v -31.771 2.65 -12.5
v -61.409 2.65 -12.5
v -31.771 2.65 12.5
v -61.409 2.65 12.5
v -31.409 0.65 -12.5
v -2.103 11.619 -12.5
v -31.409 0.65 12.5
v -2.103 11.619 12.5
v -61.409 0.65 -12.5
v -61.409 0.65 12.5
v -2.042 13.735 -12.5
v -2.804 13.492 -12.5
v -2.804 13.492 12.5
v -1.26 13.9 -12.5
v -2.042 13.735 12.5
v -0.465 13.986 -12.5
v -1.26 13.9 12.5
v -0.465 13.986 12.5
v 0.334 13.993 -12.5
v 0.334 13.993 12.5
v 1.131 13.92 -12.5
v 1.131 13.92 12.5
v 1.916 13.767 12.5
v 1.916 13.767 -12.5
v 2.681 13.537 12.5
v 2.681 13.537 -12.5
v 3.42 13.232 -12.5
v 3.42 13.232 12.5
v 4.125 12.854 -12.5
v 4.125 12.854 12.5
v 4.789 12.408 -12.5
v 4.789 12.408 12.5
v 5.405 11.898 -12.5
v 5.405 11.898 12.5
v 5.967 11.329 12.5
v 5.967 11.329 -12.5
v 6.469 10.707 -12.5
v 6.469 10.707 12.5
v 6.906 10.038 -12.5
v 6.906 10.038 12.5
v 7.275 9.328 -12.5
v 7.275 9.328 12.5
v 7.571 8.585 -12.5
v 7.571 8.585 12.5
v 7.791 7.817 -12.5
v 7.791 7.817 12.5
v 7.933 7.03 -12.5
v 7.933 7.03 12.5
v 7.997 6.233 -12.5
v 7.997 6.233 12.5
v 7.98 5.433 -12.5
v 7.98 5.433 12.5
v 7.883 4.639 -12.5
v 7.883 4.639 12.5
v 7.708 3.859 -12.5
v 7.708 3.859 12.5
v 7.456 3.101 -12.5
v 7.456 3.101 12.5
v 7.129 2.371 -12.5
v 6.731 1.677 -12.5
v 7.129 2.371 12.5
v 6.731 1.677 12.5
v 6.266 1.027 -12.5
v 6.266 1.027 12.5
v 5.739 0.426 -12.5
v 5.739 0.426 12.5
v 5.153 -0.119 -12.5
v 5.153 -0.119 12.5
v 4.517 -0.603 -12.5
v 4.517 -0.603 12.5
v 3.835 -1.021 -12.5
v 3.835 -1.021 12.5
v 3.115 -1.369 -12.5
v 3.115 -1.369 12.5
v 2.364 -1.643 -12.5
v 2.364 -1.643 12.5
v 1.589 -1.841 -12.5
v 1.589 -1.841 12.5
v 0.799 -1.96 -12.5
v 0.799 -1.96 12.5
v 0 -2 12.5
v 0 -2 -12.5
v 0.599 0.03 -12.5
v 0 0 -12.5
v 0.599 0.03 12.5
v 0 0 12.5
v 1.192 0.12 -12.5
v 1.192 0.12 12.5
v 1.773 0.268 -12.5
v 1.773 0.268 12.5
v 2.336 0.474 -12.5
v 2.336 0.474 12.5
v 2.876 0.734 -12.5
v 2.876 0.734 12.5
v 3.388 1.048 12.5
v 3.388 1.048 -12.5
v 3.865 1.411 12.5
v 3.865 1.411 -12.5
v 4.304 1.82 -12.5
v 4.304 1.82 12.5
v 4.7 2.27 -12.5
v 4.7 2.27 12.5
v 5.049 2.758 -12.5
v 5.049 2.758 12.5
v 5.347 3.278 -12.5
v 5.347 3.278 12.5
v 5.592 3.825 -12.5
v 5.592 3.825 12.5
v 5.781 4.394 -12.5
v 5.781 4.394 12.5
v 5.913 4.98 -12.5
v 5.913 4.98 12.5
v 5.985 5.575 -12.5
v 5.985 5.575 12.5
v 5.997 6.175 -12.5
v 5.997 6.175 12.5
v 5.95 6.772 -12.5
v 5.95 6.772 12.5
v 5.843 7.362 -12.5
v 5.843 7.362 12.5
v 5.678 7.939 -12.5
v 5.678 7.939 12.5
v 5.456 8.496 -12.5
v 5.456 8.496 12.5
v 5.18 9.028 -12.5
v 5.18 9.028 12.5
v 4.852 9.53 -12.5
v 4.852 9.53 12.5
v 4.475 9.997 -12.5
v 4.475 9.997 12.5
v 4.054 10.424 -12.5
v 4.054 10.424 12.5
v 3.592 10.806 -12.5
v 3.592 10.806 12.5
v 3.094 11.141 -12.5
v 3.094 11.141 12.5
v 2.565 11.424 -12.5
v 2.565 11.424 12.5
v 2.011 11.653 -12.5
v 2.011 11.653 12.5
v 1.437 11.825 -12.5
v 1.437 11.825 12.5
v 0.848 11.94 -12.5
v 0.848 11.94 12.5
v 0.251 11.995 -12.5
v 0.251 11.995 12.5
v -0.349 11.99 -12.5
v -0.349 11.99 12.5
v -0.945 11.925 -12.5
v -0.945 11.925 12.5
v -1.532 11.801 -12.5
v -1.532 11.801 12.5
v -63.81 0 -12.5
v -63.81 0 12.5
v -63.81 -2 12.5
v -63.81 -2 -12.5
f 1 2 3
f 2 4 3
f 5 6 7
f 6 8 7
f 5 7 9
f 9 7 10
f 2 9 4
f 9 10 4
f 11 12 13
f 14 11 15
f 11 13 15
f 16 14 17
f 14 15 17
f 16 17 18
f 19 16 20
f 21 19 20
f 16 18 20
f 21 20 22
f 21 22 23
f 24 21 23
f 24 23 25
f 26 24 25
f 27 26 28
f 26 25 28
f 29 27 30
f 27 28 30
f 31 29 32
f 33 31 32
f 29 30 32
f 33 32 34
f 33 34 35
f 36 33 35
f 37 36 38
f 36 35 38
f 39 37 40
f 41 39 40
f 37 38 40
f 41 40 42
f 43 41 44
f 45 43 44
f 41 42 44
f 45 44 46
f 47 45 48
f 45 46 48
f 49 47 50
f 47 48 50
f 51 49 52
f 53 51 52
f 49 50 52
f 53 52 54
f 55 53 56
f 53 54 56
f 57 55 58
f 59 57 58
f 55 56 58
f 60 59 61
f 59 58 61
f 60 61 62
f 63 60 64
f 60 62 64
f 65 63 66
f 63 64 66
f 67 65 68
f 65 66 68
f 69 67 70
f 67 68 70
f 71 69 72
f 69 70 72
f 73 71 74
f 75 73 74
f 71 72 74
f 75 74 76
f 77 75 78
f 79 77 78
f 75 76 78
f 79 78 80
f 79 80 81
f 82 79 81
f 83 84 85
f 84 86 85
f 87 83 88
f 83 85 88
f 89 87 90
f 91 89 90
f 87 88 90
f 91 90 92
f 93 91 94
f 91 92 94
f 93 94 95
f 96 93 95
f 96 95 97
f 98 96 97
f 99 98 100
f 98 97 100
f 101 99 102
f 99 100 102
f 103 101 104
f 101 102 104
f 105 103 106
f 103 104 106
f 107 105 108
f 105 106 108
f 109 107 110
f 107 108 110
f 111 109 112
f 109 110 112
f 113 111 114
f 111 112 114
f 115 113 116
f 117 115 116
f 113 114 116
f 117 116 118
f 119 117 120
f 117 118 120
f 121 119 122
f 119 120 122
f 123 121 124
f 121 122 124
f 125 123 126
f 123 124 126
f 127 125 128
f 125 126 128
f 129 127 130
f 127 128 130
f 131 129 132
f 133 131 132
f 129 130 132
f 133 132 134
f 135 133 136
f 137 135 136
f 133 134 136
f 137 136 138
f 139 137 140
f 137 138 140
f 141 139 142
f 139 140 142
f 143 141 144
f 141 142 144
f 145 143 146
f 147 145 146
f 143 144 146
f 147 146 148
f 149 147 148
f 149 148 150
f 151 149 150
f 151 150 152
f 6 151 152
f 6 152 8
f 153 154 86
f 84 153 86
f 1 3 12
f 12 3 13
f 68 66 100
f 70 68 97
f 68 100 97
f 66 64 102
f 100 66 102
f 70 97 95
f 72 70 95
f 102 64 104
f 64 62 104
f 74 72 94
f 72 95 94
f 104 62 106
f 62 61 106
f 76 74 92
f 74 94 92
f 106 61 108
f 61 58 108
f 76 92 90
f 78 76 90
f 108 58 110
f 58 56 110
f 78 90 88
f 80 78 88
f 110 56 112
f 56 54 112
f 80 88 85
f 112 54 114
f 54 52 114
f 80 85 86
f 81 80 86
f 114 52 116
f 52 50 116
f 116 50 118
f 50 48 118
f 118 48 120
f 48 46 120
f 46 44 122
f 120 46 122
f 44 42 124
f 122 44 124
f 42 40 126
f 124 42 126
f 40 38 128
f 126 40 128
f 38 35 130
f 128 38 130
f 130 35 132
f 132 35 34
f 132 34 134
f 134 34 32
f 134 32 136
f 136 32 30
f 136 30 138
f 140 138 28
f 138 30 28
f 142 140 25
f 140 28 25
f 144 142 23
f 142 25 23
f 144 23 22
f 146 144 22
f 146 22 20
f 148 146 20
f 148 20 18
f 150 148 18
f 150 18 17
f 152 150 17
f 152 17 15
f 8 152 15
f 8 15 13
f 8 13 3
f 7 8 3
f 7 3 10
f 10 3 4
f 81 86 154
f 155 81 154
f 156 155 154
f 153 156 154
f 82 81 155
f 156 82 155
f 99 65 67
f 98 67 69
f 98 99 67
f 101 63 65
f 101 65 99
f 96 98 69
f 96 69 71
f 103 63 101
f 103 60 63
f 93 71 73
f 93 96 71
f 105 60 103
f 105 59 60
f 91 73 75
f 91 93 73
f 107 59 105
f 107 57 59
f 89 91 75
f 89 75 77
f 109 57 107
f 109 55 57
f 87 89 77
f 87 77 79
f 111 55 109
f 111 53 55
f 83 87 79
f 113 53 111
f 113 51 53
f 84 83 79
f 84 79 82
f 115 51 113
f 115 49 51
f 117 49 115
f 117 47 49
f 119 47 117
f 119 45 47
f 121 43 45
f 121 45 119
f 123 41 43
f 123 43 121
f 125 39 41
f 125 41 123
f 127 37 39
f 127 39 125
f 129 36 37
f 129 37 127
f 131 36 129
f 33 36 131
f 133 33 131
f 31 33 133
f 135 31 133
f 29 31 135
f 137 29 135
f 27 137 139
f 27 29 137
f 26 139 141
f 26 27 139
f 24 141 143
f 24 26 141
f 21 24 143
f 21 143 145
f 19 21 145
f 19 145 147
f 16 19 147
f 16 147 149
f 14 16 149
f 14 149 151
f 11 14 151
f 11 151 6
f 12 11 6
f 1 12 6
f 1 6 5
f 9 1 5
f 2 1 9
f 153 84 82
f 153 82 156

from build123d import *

# Parameters (mm, degrees)
EXTRUDE_THIN1_DEPTH = 12.5


with BuildPart() as part:
    # Sketch1 → Extrude-Thin1 (new, symmetric)
    with BuildSketch(Plane.XY):
        with BuildLine():
            Line((-63.809554967, 0), (0, 0))
            ThreePointArc((0, 0), (5.904048089, 7.068745133), (-2.103307553, 11.61926128))
            Line((-2.103307553, 11.61926128), (-31.409124045, 0.65))
            Line((-31.409124045, 0.65), (-61.409124045, 0.65))
            Line((-61.409124045, 0.65), (-61.409124045, 2.65))
            Line((-61.409124045, 2.65), (-31.77116213, 2.65))
            Line((-31.77116213, 2.65), (-2.804410071, 13.492348374))
            ThreePointArc((-2.804410071, 13.492348374), (7.872064119, 7.424993511), (0, -2))
            Line((0, -2), (-63.809554967, -2))
            Line((-63.809554967, -2), (-63.809554967, 0))
        make_face()
    extrude(amount=EXTRUDE_THIN1_DEPTH, both=True)


solid = part.part
